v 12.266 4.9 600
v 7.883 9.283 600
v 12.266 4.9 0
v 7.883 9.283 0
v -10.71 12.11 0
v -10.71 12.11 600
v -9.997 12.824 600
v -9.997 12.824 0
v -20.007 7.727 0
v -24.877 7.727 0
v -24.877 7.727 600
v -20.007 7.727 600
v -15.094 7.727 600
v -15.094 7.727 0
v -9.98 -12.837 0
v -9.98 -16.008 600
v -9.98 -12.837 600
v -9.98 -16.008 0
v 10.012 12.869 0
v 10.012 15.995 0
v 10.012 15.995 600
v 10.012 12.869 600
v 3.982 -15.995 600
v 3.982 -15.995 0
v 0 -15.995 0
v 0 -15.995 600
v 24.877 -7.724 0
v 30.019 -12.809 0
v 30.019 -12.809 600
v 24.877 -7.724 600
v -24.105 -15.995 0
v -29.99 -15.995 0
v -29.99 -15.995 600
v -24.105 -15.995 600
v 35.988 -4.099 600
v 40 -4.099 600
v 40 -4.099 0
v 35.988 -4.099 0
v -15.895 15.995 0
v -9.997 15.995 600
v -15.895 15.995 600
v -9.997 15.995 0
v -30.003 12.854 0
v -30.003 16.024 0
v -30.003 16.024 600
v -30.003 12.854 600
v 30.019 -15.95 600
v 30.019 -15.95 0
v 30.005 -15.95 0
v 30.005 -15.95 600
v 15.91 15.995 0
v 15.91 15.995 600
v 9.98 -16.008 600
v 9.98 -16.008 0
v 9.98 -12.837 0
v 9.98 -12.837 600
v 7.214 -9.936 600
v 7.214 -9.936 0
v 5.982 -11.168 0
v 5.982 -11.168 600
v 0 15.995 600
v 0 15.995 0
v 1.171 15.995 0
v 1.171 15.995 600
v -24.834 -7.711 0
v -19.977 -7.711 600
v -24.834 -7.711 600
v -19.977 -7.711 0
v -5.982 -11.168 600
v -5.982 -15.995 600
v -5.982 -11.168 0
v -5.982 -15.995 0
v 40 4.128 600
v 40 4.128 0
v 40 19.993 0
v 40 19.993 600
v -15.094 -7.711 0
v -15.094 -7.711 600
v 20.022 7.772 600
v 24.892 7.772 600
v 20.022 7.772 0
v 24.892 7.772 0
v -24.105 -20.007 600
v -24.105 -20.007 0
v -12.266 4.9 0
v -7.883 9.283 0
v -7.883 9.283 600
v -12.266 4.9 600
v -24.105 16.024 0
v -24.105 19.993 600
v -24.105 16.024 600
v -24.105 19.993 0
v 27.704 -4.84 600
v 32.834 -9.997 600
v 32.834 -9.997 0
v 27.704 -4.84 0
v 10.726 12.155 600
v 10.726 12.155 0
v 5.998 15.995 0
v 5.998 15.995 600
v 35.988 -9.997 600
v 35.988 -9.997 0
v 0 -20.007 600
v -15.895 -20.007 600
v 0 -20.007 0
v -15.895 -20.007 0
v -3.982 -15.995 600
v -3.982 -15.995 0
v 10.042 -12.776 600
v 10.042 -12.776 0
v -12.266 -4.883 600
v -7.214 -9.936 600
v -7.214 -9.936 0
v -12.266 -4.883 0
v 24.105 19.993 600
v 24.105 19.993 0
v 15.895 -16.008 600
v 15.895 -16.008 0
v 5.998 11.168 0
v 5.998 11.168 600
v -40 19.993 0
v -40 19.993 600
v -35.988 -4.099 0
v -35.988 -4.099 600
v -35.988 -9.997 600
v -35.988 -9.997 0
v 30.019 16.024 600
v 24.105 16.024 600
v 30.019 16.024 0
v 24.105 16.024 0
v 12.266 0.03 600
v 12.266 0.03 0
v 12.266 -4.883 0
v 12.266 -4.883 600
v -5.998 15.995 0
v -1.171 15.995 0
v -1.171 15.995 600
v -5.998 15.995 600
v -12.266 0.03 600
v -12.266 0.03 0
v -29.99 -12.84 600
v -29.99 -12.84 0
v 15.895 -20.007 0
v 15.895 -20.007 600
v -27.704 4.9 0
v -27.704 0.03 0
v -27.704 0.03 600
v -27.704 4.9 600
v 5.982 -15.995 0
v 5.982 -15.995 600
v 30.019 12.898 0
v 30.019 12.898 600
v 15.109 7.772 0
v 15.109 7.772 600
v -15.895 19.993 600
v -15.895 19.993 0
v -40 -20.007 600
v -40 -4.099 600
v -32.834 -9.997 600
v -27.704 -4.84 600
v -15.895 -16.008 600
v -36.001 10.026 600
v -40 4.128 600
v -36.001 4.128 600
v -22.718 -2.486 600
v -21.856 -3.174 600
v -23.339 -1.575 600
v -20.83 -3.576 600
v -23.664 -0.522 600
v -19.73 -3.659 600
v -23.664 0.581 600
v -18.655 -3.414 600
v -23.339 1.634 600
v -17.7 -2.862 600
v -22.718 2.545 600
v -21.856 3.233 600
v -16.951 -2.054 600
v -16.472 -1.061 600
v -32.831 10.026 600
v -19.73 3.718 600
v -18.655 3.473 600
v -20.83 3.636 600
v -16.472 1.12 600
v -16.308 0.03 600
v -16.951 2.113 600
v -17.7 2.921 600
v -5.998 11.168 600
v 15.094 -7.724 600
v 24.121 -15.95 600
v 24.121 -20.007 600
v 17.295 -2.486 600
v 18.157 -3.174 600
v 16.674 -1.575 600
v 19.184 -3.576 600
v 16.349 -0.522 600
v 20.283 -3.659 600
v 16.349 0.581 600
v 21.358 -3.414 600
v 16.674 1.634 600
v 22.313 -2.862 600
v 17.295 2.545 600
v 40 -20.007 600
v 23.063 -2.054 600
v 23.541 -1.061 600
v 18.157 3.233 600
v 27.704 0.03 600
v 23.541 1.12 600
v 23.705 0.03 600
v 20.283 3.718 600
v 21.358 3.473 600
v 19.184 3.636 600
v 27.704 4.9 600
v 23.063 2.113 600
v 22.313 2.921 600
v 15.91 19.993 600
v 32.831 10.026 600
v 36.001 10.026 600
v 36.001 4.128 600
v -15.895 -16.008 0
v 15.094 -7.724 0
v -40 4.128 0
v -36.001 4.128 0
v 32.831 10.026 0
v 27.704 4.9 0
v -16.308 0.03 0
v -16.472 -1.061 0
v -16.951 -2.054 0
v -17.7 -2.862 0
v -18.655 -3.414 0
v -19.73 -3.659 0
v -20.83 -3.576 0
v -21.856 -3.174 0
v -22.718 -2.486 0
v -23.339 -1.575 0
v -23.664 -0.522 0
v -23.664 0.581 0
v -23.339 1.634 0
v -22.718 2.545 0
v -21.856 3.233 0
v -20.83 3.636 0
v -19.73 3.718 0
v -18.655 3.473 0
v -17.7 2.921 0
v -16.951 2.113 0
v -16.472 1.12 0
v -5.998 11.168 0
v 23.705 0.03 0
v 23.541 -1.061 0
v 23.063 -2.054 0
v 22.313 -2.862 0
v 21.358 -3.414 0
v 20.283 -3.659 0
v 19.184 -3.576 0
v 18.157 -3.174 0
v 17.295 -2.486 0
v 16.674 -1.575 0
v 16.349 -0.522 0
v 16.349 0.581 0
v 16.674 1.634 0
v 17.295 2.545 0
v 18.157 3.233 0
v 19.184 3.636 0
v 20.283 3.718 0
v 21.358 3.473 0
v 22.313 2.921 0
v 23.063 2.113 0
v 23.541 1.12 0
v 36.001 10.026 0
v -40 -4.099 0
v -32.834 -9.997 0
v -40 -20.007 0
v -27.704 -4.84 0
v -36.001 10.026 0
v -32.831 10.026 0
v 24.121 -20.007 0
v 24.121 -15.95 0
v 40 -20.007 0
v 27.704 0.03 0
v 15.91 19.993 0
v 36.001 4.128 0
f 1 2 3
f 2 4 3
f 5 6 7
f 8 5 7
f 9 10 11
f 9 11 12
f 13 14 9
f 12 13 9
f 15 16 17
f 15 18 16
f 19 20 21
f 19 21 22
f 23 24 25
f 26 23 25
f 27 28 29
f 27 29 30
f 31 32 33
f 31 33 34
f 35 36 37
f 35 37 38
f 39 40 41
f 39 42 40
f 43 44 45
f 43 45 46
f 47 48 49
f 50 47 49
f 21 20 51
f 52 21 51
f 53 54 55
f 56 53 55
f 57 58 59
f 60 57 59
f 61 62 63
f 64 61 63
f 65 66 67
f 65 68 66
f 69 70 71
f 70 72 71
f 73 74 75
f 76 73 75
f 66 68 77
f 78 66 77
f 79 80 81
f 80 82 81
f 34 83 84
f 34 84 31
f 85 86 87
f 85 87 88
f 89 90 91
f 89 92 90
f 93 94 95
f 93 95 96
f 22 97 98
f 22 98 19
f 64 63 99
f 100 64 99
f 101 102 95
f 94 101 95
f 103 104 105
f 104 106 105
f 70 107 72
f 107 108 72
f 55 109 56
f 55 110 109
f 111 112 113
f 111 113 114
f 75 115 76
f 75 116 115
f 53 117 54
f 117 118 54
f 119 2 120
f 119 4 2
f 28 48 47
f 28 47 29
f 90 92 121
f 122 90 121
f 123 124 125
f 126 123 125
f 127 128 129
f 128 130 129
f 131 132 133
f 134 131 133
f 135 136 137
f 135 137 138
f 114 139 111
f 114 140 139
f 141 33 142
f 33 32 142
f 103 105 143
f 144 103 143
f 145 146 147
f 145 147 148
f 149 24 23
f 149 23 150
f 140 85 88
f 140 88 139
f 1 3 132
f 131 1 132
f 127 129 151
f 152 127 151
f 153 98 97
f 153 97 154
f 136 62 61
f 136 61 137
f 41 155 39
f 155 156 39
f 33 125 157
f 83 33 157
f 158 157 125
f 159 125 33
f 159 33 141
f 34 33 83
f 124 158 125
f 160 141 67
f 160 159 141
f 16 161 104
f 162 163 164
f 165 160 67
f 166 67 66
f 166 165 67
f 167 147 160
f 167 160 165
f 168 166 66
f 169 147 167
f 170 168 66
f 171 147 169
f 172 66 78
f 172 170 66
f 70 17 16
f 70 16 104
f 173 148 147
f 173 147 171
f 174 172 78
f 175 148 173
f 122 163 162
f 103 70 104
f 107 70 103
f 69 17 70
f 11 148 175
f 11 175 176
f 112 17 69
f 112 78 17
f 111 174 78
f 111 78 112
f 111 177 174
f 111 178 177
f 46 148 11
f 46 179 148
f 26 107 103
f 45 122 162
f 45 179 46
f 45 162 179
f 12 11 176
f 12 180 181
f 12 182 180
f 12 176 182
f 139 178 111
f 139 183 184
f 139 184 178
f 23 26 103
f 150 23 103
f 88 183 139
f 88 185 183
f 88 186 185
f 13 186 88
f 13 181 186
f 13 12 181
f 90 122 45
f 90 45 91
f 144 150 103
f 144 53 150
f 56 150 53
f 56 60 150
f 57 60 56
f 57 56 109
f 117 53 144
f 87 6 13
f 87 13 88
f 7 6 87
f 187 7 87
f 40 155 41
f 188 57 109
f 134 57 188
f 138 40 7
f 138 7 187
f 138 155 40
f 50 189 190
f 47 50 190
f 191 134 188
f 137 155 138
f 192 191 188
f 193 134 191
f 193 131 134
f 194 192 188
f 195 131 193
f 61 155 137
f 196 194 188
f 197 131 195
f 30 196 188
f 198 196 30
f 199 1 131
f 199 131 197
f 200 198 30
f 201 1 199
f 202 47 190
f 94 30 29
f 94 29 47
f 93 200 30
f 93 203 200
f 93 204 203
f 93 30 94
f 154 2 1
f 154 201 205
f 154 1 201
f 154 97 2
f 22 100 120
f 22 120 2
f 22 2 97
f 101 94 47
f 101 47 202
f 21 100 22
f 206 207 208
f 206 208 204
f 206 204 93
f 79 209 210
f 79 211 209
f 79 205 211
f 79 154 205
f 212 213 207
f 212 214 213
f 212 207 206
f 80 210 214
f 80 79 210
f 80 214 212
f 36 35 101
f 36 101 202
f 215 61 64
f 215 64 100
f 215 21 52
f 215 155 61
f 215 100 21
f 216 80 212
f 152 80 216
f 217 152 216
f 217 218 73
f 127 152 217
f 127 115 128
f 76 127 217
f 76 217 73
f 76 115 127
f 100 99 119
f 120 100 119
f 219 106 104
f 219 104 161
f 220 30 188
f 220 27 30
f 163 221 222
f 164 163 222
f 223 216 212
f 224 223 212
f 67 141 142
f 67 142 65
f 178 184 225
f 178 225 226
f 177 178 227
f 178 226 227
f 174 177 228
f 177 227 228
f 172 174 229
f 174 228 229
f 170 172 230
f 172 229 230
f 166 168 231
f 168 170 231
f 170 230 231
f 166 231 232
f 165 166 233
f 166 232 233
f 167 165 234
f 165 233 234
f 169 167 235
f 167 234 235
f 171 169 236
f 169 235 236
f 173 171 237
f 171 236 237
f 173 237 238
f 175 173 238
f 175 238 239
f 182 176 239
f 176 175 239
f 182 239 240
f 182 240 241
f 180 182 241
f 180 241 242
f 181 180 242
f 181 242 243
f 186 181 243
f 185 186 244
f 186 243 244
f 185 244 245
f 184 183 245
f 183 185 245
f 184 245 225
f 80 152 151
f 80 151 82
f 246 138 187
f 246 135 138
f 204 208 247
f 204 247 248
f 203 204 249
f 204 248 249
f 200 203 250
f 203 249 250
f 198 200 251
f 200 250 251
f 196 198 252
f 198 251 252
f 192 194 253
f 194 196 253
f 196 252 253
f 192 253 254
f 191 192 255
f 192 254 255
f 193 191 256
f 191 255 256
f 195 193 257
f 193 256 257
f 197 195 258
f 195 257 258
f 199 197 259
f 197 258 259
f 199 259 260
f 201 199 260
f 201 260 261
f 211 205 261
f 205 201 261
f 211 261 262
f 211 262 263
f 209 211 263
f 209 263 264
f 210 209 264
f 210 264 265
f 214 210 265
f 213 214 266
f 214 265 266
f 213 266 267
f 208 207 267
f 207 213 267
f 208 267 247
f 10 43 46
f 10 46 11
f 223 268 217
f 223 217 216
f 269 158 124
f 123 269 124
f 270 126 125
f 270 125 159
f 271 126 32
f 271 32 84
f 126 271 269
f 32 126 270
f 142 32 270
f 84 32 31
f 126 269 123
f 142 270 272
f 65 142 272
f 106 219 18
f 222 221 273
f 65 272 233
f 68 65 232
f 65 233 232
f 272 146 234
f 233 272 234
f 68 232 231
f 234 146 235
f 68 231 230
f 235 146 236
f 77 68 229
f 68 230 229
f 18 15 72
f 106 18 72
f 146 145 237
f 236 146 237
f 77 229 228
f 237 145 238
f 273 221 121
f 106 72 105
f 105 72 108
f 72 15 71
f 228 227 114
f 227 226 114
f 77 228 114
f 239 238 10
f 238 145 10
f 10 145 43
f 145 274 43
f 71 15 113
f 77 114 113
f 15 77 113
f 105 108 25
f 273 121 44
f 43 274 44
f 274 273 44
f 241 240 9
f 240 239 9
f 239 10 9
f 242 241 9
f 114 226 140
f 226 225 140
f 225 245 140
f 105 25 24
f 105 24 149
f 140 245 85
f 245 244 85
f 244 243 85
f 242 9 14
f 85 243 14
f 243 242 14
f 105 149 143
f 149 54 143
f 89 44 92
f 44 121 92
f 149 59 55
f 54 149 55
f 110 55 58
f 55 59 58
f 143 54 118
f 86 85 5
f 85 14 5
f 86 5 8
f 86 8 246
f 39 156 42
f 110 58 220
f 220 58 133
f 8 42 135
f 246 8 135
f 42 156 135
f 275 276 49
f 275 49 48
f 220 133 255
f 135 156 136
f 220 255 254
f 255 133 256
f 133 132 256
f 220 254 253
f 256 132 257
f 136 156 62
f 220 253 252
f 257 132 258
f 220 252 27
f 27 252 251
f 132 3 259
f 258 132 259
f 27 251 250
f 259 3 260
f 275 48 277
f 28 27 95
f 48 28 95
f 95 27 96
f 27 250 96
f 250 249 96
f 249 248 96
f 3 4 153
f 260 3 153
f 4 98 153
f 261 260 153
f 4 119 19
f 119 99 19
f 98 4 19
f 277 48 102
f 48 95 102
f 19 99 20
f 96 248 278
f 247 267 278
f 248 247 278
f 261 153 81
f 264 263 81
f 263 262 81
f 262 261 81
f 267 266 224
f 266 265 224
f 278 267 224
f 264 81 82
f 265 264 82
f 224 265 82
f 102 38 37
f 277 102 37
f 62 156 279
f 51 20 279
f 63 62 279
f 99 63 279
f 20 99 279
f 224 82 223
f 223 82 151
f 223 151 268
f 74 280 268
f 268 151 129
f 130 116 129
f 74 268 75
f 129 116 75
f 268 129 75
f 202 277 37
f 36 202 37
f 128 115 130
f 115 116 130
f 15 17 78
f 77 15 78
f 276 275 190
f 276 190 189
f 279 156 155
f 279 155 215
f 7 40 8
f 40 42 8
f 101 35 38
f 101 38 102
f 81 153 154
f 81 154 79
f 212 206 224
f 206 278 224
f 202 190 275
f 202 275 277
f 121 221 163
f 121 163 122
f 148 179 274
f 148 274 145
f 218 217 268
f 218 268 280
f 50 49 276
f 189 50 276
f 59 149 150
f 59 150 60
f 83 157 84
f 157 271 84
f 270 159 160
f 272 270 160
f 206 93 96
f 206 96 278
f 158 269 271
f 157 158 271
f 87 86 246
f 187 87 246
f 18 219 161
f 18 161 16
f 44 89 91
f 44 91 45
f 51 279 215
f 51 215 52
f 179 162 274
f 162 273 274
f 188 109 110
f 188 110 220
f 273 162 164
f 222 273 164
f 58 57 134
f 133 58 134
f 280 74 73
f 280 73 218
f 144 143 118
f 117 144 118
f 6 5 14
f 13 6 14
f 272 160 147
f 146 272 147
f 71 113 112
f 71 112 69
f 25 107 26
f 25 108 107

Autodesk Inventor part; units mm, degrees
ref_plane "YZ Plane" through (0, 0, 0) normal (1, 0, 0) x (0, 1, 0)
ref_plane "XZ Plane" through (0, 0, 0) normal (0, 1, 0) x (-1, 0, 0)
ref_plane "XY Plane" through (0, 0, 0) normal (0, 0, 1) x (1, 0, 0)
sketch "Szkic1" plane through (0, 0, 0) normal (0, 0, 1) x (1, 0, 0)
  line L0 (-40, -20.0066) -> (-24.1053, -20.0066)
  circle A0 centre (-20.0066, 0.0296) radius 3.6988
  line L1 (-24.1053, 19.9934) -> (-24.1053, 16.0243)
  line L2 (-15.8947, 19.9934) -> (-15.8947, 15.9947)
  line L3 (-40, -4.0986) -> (-35.9881, -4.0986)
  line L4 (-40, 4.1282) -> (-36.0013, 4.1282)
  line L5 (-24.1053, -20.0066) -> (-24.1053, -15.9947)
  line L6 (-15.8947, -20.0066) -> (-15.8947, -16.0079)
  line L7 (-36.0013, 10.0263) -> (-36.0013, 4.1282)
  line L8 (-35.9881, -4.0986) -> (-35.9881, -9.9967)
  line L9 (-24.1053, 16.0243) -> (-30.0033, 16.0243)
  line L10 (-24.1053, 19.9934) -> (-40, 19.9934)
  line L11 (-29.9901, -15.9947) -> (-24.1053, -15.9947)
  line L12 (-40, -20.0066) -> (-24.1053, -20.0066)
  line L13 (-27.7041, 0.0296) -> (-27.7041, 4.8995)
  line L14 (-24.8766, 7.727) -> (-20.0066, 7.727)
  line L15 (-15.0939, 7.727) -> (-20.0066, 7.727)
  line L16 (-12.2664, 4.8995) -> (-12.2664, 0.0296)
  line L17 (-12.2664, 0.0296) -> (-12.2664, -4.8832)
  line L18 (-19.9771, -7.7107) -> (-15.0939, -7.7107)
  line L19 (-19.9771, -7.7107) -> (-24.8338, -7.7107)
  line L20 (-27.7041, -4.8404) -> (-27.7041, 0.0296)
  line L21 (-30.0033, 12.8537) -> (-24.8766, 7.727)
  line L22 (-32.8308, 10.0263) -> (-27.7041, 4.8995)
  line L23 (-30.0033, 16.0243) -> (-30.0033, 12.8537)
  line L24 (-36.0013, 10.0263) -> (-32.8308, 10.0263)
  line L25 (-32.8339, -9.9967) -> (-27.7041, -4.8404)
  line L26 (-29.9901, -12.8405) -> (-24.8338, -7.7107)
  line L27 (-29.9901, -12.8405) -> (-30.0033, -12.8536)
  line L28 (-30.0033, -15.9947) -> (-29.9901, -15.9947)
  line L29 (-29.9901, -15.9947) -> (-29.9901, -12.8405)
  line L30 (-35.9881, -9.9967) -> (-32.8339, -9.9967)
  line L31 (-7.883, 9.2829) -> (-5.998, 11.1679)
  line L32 (-7.883, 9.2829) -> (-12.2664, 4.8995)
  line L33 (-10.7105, 12.1104) -> (-9.9967, 12.8242)
  line L34 (-10.7105, 12.1104) -> (-15.0939, 7.727)
  line L35 (-40, 19.9934) -> (-40, 19.9934)
  line L36 (-9.9967, 15.9947) -> (-9.9967, 12.8242)
  line L37 (0, 15.9947) -> (-1.1712, 15.9947)
  line L38 (-9.9967, 15.9947) -> (-15.8947, 15.9947)
  line L39 (-7.2141, -9.9355) -> (-5.9817, -11.1679)
  line L40 (-7.2141, -9.9355) -> (-12.2664, -4.8832)
  line L41 (-3.9823, -15.9947) -> (-5.9817, -15.9947)
  line L42 (-9.9804, -16.0079) -> (-9.9804, -12.8374)
  line L43 (-5.998, 15.9947) -> (-5.998, 11.1679)
  line L44 (-1.1712, 15.9947) -> (-5.998, 15.9947)
  line L45 (-9.9967, 15.9947) -> (-9.9804, 15.9947)
  line L46 (-5.998, -15.9947) -> (-5.9817, -15.9947)
  line L47 (-5.9817, -15.9947) -> (-5.9817, -11.1679)
  line L48 (-15.8947, -16.0079) -> (-9.9804, -16.0079)
  line L49 (-5.9817, -15.9947) -> (0, -15.9947)
  circle A1 centre (20.0066, 0.0296) radius 3.6988
  line L50 (24.1053, 19.9934) -> (24.1053, 16.0243)
  line L51 (15.9101, 19.9934) -> (15.9101, 15.9947)
  line L52 (40, -4.0986) -> (35.9881, -4.0986)
  line L53 (40, 4.1282) -> (36.0013, 4.1282)
  line L54 (24.1206, -20.0066) -> (24.1206, -15.95)
  line L55 (15.8947, -20.0066) -> (15.8947, -16.0079)
  line L56 (36.0013, 10.0263) -> (36.0013, 4.1282)
  line L57 (35.9881, -4.0986) -> (35.9881, -9.9967)
  line L58 (24.1053, 16.0243) -> (30.0186, 16.0243)
  line L59 (24.1053, 19.9934) -> (40, 19.9934)
  line L60 (30.0054, -15.95) -> (24.1206, -15.95)
  line L61 (27.7041, 0.0296) -> (27.7041, 4.8995)
  line L62 (24.8919, 7.7717) -> (20.0219, 7.7717)
  line L63 (15.1092, 7.7717) -> (20.0219, 7.7717)
  line L64 (12.2664, 4.8995) -> (12.2664, 0.0296)
  line L65 (12.2664, 0.0296) -> (12.2664, -4.8832)
  line L66 (27.7041, -4.8404) -> (27.7041, 0.0296)
  line L67 (30.0186, 12.8985) -> (24.8919, 7.7717)
  line L68 (32.8308, 10.0263) -> (27.7041, 4.8995)
  line L69 (30.0186, 16.0243) -> (30.0186, 12.8985)
  line L70 (36.0013, 10.0263) -> (32.8308, 10.0263)
  line L71 (32.8339, -9.9967) -> (27.7041, -4.8404)
  line L72 (30.0186, -15.95) -> (30.0054, -15.95)
  line L73 (35.9881, -9.9967) -> (32.8339, -9.9967)
  line L74 (7.883, 9.2829) -> (5.998, 11.1679)
  line L75 (7.883, 9.2829) -> (12.2664, 4.8995)
  line L76 (10.7258, 12.1551) -> (10.012, 12.8689)
  line L77 (10.7258, 12.1551) -> (15.1092, 7.7717)
  line L78 (40, 19.9934) -> (40, 19.9934)
  line L79 (10.012, 15.9947) -> (10.012, 12.8689)
  line L80 (0, 15.9947) -> (1.1712, 15.9947)
  line L81 (10.012, 15.9947) -> (15.9101, 15.9947)
  line L82 (7.2141, -9.9355) -> (5.9817, -11.1679)
  line L83 (7.2141, -9.9355) -> (12.2664, -4.8832)
  line L84 (10.0416, -12.7762) -> (15.0939, -7.7239)
  line L85 (3.9823, -15.9947) -> (5.9817, -15.9947)
  line L86 (9.9804, -16.0079) -> (9.9804, -12.8374)
  line L87 (10.0416, -12.7762) -> (9.9804, -12.8374)
  line L88 (5.998, 15.9947) -> (5.998, 11.1679)
  line L89 (1.1712, 15.9947) -> (5.998, 15.9947)
  line L90 (10.012, 15.9947) -> (9.9804, 15.9947)
  line L91 (5.998, -15.9947) -> (5.9817, -15.9947)
  line L92 (5.9817, -15.9947) -> (5.9817, -11.1679)
  line L93 (15.8947, -16.0079) -> (9.9804, -16.0079)
  line L94 (5.9817, -15.9947) -> (0, -15.9947)
  line L95 (0, 16.0243) -> (0, 15.9947)
  line L96 (0, -20.0066) -> (0, -19.9934)
  line L97 (0, -16.0079) -> (0, -15.9947)
  line L98 (-40, 4.1282) -> (-40, 19.9934)
  line L99 (-40, -4.0986) -> (-40, -20.0066)
  line L100 (40, 4.1282) -> (40, 19.9934)
  line L101 (40, -20.0066) -> (40, -4.0986)
  line L102 (24.1206, -20.0066) -> (40, -20.0066)
  line L103 (24.8766, -7.7239) -> (15.0939, -7.7239)
  line L104 (30.0186, -15.95) -> (30.0186, -12.8089)
  line L105 (30.0186, -12.8089) -> (24.8766, -7.7239)
  line L106 (-15.8947, -20.0066) -> (15.8947, -20.0066)
  line L107 (-9.9804, -12.8374) -> (-15.0939, -7.7107)
  line L108 (-15.8947, 19.9934) -> (15.9101, 19.9934)
  point P0 (0, 0)
  dimension "d54" = 40
  dimension "d56" = 80
  dimension "d57" = 80
  dimension "d61" = 40
  dimension "d62" = 40
  dimension "d65" = 0
  dimension "d66" = 0
extrude "Wyciągnięcie proste2" add sketch "Szkic1" along normal blind 600
properties part number "Profil aluminiowy alutec K&K 104080"
